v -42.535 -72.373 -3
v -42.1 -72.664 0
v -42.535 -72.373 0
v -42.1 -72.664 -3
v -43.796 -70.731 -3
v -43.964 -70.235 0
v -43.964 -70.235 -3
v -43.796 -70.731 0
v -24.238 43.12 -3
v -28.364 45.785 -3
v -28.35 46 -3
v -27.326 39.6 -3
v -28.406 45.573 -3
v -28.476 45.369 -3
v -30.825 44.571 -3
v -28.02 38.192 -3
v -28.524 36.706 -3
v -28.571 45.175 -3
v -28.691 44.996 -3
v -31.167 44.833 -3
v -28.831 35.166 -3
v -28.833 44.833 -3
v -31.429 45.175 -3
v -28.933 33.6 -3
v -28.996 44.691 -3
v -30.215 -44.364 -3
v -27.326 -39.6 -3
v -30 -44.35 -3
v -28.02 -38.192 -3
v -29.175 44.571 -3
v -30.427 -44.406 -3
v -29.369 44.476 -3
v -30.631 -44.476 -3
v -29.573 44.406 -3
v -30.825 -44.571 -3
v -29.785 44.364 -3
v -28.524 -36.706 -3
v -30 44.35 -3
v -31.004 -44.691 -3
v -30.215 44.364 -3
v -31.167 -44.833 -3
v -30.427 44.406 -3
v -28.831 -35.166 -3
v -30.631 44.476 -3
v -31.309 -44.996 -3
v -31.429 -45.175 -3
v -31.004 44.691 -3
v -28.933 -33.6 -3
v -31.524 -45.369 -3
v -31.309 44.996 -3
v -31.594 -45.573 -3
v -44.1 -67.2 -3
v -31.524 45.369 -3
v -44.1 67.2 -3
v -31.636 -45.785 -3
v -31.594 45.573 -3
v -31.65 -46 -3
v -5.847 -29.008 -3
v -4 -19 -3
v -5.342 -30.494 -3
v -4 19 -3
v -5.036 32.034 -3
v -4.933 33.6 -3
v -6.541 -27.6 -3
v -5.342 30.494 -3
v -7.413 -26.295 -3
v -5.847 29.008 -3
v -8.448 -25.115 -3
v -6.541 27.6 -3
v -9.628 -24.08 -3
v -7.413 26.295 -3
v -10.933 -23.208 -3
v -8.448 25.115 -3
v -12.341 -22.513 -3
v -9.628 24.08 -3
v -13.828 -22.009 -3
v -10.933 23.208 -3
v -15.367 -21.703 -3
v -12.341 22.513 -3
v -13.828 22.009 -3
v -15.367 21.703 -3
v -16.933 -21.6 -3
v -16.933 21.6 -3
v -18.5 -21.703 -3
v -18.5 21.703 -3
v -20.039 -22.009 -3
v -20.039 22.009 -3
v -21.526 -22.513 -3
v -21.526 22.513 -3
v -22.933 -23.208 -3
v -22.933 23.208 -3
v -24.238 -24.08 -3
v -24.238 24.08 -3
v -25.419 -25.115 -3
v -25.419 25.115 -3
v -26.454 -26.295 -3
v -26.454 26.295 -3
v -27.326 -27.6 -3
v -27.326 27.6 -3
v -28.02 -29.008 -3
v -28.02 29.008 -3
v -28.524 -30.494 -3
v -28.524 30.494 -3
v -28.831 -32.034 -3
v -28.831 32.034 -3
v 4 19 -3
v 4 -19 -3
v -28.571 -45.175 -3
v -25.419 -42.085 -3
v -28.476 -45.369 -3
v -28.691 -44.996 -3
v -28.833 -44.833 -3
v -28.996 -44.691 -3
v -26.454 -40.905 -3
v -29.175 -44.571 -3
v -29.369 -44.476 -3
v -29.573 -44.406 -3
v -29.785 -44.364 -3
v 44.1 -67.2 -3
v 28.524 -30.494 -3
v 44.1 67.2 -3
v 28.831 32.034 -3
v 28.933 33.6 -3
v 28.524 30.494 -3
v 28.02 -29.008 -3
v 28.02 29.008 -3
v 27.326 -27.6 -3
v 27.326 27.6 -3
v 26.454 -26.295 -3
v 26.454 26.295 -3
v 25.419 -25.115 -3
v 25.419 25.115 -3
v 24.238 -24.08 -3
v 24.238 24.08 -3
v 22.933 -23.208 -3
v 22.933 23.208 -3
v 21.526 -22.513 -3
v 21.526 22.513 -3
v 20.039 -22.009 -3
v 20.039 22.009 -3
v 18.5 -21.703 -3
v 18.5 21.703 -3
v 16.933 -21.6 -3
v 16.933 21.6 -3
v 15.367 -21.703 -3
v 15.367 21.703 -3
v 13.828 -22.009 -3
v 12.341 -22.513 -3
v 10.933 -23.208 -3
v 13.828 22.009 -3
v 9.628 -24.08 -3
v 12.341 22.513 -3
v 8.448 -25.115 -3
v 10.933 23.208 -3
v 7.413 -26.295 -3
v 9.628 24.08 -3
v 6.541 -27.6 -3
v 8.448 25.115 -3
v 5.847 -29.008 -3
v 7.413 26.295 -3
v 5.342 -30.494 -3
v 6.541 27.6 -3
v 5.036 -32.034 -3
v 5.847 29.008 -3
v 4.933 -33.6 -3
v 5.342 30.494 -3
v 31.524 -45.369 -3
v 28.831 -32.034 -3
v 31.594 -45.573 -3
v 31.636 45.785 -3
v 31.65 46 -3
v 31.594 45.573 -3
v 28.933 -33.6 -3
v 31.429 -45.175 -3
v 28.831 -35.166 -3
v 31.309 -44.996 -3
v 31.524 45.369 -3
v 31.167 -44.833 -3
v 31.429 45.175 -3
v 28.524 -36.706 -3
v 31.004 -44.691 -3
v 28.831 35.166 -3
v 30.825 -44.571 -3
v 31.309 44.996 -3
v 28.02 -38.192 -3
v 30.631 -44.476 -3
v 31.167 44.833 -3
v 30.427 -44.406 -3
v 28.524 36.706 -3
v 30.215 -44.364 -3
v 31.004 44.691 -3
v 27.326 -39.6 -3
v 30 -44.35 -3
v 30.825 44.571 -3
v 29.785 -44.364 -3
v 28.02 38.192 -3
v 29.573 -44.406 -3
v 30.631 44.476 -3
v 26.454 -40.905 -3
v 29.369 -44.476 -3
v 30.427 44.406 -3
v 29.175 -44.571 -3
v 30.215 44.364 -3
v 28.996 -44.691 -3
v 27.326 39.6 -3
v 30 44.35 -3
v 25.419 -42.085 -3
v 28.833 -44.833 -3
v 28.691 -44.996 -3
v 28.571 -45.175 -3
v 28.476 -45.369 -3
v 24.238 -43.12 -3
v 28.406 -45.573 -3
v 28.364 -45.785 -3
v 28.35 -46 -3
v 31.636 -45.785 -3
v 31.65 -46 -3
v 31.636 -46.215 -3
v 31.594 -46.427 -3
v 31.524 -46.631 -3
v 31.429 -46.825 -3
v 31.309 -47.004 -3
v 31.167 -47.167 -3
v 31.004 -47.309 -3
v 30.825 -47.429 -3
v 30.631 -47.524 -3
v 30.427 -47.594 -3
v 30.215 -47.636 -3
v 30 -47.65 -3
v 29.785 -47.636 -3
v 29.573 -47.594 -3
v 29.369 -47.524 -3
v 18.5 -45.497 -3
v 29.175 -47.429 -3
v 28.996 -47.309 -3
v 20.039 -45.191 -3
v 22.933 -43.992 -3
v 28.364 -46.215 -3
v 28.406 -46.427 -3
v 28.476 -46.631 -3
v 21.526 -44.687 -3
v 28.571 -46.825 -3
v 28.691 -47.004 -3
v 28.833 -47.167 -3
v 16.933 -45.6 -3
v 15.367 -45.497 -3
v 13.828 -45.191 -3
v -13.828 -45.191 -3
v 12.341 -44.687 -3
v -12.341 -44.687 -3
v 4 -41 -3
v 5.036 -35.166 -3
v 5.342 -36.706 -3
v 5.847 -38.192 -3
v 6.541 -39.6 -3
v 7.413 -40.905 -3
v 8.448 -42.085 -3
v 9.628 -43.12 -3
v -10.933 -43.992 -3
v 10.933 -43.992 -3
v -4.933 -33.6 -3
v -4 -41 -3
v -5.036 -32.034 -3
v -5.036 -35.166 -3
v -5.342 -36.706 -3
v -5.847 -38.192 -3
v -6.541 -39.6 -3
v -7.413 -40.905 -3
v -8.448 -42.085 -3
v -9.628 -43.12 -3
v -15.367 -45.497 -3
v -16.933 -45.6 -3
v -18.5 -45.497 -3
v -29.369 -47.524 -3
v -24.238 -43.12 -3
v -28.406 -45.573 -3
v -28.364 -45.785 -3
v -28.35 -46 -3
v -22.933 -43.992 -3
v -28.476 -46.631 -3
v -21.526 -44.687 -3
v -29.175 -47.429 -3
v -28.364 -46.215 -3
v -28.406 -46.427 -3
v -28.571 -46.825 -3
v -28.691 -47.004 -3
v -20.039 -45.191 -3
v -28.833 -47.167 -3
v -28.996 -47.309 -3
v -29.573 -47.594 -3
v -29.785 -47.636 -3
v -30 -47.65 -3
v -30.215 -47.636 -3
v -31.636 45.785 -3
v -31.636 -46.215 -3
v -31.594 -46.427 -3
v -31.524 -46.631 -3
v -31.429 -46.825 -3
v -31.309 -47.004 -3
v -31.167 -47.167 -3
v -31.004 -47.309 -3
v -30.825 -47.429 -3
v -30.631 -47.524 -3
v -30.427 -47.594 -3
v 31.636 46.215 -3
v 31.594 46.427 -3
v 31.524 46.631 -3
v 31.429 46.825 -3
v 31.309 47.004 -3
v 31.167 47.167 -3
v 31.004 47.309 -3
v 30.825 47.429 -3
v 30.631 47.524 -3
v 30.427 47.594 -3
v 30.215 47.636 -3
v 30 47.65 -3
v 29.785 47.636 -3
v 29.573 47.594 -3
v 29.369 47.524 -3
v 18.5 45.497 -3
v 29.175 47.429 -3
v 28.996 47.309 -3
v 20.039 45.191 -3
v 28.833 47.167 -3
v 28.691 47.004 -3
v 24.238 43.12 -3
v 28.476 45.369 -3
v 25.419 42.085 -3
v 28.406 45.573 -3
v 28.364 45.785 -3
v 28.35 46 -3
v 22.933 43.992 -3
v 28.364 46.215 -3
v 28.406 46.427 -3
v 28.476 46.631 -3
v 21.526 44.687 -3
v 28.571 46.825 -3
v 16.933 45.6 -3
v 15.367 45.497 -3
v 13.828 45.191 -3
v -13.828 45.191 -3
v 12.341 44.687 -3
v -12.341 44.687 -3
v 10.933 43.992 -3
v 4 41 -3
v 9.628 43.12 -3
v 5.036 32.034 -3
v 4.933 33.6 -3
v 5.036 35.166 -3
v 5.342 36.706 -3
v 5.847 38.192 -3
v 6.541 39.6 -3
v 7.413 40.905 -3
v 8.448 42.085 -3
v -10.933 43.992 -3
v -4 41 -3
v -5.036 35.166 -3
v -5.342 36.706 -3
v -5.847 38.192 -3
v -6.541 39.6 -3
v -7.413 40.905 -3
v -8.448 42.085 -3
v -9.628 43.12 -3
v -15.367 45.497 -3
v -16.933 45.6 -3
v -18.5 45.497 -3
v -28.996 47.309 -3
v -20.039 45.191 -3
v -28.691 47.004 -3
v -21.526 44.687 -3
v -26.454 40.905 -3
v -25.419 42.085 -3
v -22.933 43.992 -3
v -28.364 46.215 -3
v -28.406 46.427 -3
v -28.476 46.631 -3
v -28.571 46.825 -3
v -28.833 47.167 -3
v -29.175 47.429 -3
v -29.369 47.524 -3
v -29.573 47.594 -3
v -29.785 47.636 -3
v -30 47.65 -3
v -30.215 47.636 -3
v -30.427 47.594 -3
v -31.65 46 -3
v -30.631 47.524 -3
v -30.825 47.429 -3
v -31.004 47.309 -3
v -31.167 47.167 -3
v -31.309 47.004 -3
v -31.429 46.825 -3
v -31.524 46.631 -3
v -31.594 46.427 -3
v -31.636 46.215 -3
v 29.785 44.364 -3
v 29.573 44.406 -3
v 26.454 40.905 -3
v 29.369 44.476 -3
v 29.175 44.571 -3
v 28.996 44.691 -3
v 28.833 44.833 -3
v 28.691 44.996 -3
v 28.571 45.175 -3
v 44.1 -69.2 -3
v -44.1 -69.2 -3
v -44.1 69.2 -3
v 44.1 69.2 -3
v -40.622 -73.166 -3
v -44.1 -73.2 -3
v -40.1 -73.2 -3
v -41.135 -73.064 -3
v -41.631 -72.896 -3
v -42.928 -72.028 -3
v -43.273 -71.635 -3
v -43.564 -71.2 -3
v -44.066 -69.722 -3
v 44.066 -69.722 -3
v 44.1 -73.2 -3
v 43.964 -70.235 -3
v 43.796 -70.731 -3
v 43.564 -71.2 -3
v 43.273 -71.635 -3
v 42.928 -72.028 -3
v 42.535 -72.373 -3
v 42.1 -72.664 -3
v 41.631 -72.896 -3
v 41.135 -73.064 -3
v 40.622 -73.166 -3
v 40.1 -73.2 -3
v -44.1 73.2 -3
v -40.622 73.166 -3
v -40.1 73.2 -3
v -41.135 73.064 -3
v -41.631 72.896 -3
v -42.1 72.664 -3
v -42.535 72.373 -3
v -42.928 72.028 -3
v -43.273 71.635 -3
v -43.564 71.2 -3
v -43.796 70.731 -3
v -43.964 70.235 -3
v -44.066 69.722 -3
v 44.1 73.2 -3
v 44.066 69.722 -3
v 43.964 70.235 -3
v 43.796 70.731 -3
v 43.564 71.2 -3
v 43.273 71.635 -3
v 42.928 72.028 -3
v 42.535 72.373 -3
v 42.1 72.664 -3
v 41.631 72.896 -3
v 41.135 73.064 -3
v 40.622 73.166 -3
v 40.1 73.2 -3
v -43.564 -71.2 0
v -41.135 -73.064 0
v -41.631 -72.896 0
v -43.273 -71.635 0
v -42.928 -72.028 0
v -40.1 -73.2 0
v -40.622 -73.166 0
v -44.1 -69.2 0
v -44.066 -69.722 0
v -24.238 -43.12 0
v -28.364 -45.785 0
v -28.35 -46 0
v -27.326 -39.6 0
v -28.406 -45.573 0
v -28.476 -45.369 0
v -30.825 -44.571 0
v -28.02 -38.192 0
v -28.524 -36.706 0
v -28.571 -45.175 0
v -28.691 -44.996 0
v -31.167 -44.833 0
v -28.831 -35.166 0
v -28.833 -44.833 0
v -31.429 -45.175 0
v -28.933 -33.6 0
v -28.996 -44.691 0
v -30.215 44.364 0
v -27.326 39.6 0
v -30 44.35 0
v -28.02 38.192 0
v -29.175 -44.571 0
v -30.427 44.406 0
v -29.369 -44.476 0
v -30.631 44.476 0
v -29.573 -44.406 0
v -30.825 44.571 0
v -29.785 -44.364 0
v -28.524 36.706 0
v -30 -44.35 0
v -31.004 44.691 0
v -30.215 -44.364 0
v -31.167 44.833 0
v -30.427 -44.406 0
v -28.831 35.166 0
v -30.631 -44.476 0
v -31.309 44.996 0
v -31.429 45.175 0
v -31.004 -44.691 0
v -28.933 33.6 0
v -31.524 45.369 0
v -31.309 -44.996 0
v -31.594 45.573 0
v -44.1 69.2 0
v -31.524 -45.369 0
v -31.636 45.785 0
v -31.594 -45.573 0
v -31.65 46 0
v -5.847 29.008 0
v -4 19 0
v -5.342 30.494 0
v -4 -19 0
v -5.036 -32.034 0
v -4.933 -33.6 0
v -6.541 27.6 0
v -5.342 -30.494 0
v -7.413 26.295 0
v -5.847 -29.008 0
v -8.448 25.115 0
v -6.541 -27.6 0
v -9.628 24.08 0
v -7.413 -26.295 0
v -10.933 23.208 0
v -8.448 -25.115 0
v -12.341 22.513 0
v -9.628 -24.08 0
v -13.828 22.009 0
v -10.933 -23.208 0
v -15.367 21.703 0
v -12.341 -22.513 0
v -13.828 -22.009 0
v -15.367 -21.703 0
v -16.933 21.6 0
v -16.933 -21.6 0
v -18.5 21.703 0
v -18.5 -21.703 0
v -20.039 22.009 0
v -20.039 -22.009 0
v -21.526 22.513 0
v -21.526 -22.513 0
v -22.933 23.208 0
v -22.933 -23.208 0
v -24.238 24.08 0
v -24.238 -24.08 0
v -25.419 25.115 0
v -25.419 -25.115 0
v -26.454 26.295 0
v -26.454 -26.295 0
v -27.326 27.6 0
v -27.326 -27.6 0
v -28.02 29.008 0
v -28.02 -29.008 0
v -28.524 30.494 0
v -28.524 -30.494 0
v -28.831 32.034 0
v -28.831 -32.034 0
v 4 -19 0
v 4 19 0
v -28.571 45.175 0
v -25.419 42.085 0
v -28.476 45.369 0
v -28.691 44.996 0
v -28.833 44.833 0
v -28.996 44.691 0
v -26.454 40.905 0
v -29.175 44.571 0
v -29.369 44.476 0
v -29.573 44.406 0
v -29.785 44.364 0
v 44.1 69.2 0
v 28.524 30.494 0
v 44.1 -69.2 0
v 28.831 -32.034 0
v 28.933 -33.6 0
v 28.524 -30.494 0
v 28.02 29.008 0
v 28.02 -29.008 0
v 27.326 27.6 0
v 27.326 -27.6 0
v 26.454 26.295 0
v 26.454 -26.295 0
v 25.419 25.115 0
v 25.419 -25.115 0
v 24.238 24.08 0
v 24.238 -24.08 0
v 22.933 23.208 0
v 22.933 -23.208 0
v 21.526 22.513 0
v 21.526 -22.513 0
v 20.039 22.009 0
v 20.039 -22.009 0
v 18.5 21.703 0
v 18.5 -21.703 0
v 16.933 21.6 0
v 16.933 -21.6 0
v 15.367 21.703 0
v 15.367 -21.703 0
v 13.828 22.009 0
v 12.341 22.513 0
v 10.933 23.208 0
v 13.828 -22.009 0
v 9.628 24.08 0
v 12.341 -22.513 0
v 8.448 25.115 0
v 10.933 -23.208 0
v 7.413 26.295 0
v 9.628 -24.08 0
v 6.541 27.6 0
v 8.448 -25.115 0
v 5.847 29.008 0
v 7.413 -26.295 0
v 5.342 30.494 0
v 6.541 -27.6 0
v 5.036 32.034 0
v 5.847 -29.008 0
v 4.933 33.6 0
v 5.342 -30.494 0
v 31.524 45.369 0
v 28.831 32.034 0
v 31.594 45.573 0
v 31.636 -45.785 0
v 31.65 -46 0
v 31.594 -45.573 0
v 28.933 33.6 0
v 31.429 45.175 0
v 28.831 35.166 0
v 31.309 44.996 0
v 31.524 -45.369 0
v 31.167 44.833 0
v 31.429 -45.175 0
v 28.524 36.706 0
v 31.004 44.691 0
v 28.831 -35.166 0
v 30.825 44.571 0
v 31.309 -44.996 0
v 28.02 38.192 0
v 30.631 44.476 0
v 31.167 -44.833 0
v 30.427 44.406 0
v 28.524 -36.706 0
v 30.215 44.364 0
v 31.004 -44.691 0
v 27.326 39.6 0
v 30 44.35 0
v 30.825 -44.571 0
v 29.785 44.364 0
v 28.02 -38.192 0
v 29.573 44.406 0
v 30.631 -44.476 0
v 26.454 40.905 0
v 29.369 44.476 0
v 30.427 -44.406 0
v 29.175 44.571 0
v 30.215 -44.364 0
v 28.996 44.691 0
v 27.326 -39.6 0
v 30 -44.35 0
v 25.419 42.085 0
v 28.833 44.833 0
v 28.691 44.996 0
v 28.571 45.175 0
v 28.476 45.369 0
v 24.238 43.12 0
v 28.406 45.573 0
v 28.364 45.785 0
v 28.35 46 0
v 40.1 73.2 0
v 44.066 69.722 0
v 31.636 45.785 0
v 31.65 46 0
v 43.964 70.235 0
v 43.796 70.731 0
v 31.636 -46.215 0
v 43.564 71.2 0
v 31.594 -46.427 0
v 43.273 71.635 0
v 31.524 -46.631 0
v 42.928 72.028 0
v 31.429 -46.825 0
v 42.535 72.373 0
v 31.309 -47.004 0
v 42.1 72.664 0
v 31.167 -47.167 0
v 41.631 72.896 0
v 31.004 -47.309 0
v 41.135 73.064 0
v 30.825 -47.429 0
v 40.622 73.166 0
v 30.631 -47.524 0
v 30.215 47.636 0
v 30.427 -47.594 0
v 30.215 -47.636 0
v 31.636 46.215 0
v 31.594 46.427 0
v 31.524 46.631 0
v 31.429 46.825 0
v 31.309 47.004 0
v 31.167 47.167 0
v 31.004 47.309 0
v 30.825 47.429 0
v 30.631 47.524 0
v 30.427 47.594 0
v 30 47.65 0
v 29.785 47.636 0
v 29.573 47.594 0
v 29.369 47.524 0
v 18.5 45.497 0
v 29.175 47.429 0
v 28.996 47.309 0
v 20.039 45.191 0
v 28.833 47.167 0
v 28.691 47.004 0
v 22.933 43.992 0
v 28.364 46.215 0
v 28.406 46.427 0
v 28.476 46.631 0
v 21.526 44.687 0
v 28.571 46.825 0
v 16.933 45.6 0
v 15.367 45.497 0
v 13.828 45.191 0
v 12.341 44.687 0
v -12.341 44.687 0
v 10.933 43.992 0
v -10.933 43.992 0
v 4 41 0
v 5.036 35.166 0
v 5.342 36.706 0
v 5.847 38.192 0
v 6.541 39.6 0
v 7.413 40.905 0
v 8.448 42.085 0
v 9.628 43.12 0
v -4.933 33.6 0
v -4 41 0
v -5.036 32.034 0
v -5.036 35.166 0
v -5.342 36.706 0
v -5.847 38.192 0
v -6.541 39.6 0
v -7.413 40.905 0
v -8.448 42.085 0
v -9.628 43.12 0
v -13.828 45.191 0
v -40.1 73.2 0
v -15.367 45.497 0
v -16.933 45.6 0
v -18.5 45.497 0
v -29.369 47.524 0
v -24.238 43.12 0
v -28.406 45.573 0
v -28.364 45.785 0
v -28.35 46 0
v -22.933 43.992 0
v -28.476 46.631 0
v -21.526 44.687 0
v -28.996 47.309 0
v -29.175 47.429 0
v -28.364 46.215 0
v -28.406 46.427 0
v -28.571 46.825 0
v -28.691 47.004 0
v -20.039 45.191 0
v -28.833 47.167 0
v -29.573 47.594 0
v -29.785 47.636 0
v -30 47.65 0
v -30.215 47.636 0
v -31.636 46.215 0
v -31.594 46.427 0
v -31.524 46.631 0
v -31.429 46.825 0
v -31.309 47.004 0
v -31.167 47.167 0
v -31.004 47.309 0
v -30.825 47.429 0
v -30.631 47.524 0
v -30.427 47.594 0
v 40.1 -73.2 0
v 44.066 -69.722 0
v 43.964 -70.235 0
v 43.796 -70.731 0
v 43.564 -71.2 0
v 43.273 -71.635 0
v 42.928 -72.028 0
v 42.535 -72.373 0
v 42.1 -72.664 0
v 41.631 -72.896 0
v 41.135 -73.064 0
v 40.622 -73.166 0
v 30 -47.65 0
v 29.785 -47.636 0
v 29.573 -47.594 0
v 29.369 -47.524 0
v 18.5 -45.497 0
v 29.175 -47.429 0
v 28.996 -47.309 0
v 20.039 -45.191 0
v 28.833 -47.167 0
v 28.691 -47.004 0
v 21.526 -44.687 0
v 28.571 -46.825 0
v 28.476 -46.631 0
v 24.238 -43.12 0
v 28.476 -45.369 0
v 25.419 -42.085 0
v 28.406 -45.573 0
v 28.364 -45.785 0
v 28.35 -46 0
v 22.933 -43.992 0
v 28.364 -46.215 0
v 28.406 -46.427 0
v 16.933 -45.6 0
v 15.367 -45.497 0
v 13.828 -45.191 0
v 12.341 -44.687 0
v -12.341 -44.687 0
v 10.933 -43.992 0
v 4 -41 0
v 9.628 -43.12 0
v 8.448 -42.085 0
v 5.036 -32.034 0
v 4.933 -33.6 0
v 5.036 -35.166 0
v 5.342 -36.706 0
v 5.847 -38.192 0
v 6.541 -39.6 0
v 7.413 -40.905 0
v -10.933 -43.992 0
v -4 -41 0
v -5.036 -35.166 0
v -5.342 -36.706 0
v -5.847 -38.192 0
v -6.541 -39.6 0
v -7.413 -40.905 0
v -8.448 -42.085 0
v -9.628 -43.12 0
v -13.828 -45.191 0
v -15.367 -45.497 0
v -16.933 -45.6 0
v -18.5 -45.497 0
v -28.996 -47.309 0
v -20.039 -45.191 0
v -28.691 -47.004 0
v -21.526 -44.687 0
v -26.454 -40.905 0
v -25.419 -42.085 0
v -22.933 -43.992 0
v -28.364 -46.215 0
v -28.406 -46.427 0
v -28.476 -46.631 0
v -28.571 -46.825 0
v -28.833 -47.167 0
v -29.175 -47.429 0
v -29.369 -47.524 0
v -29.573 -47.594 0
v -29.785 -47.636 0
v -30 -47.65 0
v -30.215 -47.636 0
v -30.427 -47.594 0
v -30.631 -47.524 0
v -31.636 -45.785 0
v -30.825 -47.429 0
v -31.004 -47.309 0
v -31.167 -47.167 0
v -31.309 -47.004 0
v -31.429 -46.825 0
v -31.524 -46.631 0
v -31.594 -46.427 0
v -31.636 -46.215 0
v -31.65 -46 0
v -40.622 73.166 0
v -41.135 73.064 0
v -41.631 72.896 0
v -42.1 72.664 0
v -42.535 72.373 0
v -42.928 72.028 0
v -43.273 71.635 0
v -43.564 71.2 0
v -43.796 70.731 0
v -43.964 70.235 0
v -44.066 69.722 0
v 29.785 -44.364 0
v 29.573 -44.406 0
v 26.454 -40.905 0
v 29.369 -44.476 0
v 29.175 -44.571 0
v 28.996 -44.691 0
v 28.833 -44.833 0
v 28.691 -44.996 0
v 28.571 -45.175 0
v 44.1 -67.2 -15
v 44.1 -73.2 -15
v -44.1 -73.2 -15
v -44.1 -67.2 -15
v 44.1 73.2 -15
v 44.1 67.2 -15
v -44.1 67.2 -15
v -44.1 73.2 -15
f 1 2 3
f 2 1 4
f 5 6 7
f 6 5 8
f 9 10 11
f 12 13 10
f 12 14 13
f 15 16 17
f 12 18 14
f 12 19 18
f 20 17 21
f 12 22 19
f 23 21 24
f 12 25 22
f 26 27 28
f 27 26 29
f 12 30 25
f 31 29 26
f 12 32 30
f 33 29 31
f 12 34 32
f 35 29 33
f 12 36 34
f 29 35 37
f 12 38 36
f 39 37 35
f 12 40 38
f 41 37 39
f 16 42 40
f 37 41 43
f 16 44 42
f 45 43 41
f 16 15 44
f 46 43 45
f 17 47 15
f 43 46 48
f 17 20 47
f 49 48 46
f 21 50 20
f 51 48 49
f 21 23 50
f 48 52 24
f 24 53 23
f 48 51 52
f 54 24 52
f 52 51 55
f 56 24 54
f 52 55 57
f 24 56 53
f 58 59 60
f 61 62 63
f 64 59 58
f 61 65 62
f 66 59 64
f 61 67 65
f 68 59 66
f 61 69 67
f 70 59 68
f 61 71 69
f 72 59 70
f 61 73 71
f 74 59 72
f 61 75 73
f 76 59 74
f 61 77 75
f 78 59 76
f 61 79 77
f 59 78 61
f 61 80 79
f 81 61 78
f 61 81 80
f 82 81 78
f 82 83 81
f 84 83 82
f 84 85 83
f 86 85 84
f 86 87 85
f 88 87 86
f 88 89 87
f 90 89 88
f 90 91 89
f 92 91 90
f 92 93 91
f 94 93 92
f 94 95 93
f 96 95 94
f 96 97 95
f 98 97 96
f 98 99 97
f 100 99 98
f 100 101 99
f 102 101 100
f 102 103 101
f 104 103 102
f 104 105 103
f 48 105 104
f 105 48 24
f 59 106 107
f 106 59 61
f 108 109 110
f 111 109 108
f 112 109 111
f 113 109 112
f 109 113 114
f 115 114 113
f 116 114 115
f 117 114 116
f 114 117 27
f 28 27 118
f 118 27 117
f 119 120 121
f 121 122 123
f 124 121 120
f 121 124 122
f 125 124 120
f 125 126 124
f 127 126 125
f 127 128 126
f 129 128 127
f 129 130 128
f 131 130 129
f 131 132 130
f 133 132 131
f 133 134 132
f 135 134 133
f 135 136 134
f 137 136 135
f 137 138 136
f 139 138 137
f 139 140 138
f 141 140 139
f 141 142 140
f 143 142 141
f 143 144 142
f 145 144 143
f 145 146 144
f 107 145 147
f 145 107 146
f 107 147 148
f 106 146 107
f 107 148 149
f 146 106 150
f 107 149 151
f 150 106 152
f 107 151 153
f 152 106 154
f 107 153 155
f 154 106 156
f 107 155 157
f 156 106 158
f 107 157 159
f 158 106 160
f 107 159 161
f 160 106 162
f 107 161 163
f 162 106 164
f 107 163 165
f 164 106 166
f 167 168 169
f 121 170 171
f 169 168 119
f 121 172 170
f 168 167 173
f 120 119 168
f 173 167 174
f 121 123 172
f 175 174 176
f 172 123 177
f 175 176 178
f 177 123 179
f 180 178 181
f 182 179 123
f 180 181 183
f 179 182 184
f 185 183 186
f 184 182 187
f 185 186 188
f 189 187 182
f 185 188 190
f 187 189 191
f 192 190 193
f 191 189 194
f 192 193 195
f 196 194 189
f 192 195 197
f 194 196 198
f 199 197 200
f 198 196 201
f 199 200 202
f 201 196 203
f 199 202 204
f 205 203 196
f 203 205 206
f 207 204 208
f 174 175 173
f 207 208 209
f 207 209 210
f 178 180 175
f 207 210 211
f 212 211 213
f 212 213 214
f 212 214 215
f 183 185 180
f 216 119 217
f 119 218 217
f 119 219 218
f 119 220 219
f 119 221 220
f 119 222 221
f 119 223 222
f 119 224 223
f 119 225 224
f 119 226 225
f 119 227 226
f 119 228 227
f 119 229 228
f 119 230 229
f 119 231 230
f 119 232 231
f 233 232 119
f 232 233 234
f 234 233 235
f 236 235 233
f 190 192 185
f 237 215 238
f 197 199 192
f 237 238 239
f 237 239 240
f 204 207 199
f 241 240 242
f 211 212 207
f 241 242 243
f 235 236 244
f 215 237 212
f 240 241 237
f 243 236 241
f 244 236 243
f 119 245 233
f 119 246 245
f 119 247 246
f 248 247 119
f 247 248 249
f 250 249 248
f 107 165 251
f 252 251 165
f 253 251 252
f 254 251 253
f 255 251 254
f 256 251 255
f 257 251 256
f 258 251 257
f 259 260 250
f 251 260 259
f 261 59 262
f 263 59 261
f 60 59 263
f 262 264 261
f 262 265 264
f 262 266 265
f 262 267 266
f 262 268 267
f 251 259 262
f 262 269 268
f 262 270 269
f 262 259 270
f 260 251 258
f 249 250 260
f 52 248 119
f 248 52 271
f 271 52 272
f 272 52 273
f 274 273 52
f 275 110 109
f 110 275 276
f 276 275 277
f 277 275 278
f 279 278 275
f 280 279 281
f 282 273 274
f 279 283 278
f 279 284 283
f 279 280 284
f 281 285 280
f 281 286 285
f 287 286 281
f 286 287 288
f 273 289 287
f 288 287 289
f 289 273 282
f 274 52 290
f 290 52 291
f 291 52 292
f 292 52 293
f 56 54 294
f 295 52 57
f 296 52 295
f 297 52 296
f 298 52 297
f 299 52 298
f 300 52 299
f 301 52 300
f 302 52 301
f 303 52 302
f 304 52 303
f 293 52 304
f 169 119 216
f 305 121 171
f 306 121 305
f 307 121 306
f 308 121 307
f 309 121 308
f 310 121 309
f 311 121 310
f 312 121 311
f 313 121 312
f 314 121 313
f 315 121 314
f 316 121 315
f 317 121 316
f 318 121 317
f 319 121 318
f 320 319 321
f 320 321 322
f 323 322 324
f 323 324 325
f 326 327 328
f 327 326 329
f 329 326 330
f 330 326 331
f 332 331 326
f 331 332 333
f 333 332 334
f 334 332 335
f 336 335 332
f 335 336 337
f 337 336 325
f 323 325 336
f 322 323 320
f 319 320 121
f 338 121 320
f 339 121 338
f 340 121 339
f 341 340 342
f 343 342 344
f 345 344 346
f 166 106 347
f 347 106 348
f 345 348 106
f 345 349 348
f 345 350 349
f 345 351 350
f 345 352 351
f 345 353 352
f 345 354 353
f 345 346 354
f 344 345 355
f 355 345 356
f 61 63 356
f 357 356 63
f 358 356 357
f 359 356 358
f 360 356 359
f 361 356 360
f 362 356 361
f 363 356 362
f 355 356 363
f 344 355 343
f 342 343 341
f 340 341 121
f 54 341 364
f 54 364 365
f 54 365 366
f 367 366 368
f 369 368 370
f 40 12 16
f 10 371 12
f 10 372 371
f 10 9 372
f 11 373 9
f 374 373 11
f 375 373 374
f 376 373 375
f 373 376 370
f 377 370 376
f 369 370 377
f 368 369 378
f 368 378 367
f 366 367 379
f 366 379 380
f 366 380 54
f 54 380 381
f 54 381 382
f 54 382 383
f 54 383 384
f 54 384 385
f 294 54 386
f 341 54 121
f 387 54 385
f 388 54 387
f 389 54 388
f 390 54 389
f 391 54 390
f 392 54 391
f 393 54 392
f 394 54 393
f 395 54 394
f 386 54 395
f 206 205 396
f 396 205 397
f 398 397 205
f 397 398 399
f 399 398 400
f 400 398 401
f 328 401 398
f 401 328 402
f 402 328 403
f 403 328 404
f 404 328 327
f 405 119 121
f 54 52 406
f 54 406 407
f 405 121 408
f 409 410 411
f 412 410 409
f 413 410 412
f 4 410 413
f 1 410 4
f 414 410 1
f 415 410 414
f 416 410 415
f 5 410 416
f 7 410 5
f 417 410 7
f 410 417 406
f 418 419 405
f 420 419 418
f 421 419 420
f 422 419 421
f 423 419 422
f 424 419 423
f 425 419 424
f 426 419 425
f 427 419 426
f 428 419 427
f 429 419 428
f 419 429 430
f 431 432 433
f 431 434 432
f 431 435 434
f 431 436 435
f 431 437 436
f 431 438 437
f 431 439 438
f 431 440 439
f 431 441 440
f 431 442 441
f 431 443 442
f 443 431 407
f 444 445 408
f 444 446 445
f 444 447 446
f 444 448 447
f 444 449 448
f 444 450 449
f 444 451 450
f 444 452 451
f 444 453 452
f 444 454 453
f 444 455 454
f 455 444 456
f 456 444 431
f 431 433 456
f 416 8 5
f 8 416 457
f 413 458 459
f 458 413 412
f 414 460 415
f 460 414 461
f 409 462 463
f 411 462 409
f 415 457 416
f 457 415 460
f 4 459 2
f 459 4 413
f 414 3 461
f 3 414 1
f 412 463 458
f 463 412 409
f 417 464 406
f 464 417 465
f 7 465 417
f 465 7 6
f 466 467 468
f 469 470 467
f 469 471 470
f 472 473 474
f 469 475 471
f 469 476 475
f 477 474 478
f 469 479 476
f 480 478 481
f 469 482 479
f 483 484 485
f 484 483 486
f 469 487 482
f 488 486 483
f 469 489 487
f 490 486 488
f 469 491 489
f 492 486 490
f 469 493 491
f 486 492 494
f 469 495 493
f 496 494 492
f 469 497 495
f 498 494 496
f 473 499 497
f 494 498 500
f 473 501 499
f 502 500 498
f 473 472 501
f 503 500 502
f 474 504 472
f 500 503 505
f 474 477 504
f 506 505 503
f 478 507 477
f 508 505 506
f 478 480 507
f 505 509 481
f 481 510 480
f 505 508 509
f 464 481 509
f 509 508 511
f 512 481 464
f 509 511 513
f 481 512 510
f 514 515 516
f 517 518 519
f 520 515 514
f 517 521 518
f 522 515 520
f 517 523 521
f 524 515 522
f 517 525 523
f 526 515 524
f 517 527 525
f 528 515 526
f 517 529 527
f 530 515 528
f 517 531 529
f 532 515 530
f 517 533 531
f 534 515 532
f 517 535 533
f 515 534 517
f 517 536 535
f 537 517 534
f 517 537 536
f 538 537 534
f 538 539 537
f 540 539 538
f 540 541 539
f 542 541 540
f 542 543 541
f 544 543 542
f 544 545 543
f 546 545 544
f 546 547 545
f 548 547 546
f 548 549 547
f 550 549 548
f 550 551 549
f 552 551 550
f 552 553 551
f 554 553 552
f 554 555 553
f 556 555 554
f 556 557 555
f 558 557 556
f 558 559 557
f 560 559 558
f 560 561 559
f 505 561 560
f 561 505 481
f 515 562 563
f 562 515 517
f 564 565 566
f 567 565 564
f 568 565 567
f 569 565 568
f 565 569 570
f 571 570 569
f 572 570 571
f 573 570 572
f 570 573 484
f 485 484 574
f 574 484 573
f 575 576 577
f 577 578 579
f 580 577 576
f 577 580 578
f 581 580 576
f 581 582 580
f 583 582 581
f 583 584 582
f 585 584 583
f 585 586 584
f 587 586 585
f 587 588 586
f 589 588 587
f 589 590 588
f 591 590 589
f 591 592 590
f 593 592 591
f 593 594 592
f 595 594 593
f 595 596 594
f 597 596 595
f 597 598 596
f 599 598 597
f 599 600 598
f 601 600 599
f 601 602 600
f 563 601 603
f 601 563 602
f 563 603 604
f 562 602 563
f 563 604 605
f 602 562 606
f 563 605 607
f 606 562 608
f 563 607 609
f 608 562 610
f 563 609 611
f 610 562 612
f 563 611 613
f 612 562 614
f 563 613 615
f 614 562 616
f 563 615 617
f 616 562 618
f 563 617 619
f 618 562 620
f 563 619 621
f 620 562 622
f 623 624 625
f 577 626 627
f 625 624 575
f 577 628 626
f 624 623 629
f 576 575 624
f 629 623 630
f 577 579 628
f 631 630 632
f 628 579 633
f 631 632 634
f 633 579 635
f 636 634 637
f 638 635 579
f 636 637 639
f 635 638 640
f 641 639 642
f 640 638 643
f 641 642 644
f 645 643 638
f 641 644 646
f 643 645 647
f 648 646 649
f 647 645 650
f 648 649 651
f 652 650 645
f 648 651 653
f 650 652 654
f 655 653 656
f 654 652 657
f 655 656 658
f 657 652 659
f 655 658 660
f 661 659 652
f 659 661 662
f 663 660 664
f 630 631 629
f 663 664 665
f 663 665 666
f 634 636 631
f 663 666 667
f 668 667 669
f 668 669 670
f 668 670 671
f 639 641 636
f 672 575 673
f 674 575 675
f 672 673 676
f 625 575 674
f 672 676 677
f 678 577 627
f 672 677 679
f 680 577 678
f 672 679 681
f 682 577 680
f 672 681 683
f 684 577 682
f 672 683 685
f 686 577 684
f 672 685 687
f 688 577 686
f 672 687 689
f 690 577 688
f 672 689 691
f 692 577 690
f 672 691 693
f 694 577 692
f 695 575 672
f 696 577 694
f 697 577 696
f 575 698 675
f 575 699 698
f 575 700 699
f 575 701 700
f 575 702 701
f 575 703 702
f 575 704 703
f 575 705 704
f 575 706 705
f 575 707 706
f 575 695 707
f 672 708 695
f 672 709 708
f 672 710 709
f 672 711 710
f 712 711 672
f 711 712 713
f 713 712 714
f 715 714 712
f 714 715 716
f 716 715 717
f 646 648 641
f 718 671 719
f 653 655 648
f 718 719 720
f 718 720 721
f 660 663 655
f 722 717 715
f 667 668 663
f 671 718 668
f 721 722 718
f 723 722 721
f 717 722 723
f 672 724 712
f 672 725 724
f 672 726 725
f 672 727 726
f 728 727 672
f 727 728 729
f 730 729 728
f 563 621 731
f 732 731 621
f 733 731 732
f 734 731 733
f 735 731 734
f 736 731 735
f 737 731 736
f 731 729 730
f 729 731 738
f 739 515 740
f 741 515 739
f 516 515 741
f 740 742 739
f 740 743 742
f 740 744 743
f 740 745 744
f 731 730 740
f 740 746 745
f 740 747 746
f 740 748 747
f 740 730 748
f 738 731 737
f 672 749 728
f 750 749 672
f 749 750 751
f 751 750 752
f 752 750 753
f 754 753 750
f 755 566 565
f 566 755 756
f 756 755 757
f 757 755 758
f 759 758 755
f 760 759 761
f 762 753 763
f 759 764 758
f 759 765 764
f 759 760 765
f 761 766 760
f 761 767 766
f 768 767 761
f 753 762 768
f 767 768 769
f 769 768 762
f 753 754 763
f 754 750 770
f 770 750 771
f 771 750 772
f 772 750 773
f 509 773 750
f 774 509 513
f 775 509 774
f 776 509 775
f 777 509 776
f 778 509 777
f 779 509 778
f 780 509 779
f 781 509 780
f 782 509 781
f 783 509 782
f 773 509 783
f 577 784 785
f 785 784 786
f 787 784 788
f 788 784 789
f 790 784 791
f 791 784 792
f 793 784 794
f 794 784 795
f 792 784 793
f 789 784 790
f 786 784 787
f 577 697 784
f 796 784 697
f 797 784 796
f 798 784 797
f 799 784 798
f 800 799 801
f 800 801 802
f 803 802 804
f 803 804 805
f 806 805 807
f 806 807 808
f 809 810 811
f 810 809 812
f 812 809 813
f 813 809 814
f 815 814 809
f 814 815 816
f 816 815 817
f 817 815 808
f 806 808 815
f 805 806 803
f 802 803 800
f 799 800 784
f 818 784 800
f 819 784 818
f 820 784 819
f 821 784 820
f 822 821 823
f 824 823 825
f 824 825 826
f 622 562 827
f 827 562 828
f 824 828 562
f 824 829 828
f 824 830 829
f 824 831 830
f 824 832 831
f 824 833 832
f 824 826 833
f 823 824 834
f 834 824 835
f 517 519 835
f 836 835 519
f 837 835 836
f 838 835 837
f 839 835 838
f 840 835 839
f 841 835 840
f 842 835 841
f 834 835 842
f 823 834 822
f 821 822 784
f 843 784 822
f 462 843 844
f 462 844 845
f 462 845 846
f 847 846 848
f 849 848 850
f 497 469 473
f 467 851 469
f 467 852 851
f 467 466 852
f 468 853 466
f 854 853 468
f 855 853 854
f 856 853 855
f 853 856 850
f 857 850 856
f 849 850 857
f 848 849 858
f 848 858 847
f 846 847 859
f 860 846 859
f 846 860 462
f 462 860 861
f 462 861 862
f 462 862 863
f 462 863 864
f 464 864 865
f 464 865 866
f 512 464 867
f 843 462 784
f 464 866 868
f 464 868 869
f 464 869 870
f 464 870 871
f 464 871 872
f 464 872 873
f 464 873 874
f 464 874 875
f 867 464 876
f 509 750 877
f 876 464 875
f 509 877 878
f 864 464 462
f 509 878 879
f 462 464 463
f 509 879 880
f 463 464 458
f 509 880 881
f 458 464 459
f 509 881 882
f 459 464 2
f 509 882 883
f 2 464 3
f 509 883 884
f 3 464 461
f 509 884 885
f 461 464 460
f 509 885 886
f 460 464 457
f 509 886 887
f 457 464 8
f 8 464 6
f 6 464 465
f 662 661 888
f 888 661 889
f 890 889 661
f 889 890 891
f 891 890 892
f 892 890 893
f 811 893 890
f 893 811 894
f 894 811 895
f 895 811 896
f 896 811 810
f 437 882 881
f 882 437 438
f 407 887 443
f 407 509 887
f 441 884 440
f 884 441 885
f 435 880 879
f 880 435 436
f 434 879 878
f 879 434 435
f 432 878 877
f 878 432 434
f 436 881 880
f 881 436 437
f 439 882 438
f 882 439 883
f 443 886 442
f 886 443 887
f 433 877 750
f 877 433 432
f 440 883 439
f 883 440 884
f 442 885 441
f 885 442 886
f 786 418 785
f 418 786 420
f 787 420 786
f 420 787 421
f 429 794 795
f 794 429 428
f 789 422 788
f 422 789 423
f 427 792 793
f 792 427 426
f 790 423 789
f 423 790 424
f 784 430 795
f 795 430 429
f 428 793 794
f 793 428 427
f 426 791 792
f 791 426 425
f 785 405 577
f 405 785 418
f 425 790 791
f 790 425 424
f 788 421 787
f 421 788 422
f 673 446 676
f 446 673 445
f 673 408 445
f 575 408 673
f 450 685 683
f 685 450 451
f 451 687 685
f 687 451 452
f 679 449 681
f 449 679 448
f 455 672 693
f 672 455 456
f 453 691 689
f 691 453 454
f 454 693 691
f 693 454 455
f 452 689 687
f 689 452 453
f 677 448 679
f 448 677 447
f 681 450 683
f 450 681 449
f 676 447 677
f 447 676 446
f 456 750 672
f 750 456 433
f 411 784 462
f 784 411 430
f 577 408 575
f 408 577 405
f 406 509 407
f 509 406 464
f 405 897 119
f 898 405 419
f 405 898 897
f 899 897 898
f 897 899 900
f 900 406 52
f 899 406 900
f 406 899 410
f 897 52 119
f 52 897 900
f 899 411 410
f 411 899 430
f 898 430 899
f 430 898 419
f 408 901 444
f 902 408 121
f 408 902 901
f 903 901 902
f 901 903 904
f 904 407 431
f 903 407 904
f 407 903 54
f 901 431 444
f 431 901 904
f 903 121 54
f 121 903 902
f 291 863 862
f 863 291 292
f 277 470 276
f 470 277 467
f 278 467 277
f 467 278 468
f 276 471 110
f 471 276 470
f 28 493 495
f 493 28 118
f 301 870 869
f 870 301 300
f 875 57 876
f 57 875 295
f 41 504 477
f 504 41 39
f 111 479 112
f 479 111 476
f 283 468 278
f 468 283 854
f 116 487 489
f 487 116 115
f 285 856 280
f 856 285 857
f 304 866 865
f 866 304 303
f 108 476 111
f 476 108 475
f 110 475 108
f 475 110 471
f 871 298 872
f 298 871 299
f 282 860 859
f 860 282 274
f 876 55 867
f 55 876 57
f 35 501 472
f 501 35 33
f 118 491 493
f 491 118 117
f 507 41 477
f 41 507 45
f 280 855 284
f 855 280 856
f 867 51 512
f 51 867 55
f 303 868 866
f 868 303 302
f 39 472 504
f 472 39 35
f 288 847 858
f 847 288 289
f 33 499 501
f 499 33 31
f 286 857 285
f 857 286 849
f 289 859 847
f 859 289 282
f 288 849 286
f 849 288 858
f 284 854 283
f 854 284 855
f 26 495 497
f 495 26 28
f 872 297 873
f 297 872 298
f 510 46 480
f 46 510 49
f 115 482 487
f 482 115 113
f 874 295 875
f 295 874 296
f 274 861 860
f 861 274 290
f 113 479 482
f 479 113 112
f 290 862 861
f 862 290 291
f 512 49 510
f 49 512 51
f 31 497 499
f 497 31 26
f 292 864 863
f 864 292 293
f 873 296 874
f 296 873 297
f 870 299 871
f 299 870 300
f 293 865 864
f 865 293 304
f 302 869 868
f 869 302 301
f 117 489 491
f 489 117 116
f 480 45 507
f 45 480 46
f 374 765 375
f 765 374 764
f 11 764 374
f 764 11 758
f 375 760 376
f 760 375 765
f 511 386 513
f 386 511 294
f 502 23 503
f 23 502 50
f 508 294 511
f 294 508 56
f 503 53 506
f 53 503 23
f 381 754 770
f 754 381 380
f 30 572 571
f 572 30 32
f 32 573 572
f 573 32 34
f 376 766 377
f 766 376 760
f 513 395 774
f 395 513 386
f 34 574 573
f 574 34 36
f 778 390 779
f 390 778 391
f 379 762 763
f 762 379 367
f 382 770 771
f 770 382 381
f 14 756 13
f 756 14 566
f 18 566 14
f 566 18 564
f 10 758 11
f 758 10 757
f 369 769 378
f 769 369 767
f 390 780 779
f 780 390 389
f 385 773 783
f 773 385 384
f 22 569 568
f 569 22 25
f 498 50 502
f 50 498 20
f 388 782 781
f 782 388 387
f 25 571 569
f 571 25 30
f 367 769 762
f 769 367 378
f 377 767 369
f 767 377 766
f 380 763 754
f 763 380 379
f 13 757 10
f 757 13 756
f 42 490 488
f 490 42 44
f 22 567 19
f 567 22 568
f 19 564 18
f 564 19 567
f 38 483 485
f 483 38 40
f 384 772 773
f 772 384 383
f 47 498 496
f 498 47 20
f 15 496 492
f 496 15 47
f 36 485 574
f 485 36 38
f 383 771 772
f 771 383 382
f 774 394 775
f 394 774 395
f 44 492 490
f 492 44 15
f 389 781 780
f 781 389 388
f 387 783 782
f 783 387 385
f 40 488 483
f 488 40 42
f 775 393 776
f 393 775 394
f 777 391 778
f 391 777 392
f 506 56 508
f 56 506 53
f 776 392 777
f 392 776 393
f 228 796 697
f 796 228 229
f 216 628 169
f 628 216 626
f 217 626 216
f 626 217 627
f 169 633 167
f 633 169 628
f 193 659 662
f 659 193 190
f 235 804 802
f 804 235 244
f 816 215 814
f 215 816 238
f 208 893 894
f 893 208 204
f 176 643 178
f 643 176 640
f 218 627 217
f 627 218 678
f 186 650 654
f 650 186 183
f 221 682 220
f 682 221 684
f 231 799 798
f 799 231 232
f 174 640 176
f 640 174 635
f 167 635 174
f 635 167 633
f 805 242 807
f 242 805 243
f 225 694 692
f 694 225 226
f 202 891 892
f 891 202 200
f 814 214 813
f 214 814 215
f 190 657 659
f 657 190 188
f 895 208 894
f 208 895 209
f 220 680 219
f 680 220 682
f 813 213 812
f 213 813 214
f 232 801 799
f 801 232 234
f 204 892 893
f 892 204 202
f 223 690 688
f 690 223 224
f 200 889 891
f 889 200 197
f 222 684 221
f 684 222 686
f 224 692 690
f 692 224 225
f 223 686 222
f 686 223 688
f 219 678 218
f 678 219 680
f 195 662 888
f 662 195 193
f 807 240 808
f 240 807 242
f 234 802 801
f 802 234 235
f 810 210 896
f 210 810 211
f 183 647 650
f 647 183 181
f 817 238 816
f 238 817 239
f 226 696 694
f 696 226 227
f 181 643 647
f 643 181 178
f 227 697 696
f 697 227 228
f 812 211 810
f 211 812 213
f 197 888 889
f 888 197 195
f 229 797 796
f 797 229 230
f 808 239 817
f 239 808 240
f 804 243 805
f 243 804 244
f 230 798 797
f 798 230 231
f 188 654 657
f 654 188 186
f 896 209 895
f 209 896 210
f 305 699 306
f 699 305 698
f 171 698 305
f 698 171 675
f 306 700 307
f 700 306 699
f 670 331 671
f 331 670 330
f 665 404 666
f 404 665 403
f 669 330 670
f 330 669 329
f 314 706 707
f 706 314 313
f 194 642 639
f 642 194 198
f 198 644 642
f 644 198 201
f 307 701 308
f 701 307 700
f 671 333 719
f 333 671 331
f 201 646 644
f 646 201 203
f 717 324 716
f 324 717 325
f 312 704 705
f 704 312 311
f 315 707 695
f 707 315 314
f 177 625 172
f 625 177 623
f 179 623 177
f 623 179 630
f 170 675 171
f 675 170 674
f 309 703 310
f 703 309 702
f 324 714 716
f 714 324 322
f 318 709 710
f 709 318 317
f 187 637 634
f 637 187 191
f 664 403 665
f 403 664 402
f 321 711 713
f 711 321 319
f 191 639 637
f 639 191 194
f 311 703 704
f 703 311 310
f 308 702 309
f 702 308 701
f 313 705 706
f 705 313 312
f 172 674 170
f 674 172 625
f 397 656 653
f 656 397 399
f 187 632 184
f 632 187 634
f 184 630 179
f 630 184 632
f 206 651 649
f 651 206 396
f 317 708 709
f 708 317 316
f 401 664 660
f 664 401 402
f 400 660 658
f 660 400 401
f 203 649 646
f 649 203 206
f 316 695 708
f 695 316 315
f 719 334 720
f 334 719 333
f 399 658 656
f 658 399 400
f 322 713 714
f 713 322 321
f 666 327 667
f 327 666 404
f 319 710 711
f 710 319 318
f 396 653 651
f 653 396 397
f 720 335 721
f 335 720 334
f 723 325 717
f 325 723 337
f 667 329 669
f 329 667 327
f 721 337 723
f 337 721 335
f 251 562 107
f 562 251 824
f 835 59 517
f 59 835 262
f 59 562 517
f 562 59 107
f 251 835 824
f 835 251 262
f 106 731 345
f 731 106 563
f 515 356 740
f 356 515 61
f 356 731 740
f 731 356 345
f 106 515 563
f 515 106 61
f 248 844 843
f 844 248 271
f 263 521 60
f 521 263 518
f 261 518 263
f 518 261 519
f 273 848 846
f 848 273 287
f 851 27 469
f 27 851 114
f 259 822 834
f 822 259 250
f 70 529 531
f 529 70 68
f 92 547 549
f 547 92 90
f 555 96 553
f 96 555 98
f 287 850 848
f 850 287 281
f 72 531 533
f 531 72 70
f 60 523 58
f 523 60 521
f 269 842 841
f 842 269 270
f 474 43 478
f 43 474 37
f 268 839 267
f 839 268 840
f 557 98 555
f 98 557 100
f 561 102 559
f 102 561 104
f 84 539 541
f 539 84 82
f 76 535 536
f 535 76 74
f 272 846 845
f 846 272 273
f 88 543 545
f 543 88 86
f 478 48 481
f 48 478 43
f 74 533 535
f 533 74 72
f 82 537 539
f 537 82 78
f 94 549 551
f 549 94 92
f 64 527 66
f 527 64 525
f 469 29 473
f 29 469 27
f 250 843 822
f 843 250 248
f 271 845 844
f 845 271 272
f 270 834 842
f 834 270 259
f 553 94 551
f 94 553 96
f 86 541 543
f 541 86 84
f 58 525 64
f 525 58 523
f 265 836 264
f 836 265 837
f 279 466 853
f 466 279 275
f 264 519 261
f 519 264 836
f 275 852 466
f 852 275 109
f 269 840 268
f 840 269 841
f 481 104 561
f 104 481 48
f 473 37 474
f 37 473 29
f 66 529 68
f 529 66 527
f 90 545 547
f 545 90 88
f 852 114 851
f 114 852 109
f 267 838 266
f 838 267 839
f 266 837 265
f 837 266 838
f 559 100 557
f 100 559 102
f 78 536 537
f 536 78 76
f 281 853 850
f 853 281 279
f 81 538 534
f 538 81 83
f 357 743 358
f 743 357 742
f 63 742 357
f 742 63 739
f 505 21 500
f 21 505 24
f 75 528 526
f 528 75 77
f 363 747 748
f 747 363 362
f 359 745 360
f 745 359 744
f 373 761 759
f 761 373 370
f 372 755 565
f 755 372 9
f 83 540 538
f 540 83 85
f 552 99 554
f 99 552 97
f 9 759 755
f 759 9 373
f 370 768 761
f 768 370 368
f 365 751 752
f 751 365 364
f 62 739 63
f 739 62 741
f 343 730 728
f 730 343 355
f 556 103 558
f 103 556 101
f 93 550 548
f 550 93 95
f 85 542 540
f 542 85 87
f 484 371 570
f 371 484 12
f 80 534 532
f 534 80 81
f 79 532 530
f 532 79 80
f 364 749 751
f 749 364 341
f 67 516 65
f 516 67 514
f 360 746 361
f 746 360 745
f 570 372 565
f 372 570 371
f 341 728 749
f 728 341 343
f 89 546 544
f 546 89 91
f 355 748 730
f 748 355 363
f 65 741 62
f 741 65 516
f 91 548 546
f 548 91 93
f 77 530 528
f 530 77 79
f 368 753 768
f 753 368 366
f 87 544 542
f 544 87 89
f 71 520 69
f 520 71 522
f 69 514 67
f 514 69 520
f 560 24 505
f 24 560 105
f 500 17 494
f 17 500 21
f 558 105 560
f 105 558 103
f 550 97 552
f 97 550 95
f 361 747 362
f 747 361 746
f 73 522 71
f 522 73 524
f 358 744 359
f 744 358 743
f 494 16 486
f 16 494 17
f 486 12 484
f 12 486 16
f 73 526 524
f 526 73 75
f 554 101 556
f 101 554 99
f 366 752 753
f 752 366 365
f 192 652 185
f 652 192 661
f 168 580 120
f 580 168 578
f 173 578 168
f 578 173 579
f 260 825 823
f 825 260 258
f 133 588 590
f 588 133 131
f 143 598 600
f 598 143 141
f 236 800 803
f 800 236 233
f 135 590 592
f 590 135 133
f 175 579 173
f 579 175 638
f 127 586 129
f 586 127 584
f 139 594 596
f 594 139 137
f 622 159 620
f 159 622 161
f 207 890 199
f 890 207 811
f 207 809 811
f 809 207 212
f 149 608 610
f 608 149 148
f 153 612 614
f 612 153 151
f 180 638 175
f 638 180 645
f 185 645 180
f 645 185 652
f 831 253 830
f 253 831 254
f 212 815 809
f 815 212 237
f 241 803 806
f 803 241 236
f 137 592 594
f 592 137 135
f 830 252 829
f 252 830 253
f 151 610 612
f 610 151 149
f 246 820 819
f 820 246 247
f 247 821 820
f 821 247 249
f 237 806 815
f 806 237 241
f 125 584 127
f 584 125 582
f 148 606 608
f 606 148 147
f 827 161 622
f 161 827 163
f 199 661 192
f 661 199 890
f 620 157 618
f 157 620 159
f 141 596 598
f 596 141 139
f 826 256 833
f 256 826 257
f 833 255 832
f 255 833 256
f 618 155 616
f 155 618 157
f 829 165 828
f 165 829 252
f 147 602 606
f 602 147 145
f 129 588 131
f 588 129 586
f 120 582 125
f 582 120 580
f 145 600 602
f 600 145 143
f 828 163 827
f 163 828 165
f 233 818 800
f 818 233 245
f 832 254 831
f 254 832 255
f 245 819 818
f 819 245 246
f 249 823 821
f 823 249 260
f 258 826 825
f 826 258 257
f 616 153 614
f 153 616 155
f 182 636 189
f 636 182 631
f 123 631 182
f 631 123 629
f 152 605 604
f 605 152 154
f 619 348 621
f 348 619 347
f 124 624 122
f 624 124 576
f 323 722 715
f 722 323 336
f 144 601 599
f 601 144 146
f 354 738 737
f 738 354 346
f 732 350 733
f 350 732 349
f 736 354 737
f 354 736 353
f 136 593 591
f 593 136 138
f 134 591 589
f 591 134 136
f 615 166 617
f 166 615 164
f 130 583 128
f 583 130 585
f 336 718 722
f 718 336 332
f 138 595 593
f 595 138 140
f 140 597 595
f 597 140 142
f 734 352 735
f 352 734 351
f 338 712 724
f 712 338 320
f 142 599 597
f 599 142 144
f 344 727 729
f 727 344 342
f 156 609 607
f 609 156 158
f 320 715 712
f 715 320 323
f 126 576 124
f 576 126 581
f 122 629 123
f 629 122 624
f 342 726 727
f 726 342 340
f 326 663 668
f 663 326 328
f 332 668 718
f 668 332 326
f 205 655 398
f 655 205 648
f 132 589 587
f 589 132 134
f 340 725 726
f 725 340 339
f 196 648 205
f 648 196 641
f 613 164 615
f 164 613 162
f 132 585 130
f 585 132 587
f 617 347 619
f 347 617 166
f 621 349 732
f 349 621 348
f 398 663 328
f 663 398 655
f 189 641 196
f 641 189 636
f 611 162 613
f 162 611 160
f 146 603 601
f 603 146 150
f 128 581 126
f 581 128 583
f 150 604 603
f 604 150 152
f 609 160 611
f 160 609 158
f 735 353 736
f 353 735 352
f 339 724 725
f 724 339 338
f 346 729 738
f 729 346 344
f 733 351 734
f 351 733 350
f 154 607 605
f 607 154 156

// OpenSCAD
// file: ../common/ds_lib.scad
// DronSwarm · librería común de piezas del frame (S07-S08). Unidades: mm.
//
// Reglas (ADR-003): sin hull()/minkowski()/offset() — FreeCAD los convierte en malla y el STEP deja de ser un
// sólido válido. Las formas redondeadas se arman con uniones de cubos y cilindros. El importador CSG de FreeCAD
// también falla con booleanas 2D y con varios operandos agrupados bajo una sola transformación: cada grupo de
// agujeros debe ser hijo directo del difference(), con su propio translate.
//
// Interfaz de motor DronSwarm (DMI, ADR-011): placa con 4 ranuras radiales a 90°, de modo que el mismo soporte
// acepta varios patrones comerciales y, más adelante, el motor propio (S17+) se diseña para caer en el mismo rango.
//   DMI-S: 4×M3, círculo de tornillos Ø16-Ø25 (motores 28xx-41xx, ≤ 600 W)
//   DMI-L: 4×M4, círculo de tornillos Ø30-Ø42 (motores 50xx-70xx, ≤ 2 kW)

$fn = 48;

M3 = 3.3; M3_HEAD = 6.0; M3_NUT = 6.4;     // pasante, cabeza, tuerca (entre caras + juego)
M4 = 4.4; M4_HEAD = 7.5;
M5 = 5.4;

function dmi_bolt(iface) = iface == "L" ? M4 : M3;
function dmi_r(iface) = iface == "L" ? [15, 21] : [8, 12.5];   // radio mínimo y máximo de las ranuras
function dmi_plate_d(iface) = iface == "L" ? 56 : 36;
function dmi_center(iface) = iface == "L" ? 16 : 10;            // eje, seguro y paso de cables

// Rectángulo con esquinas redondeadas (2D) y su extrusión
module rrect2d(size, r) {
    r2 = min(r, size[0] / 2 - 0.01, size[1] / 2 - 0.01);
    union() {
        translate([r2, 0]) square([size[0] - 2 * r2, size[1]]);
        translate([0, r2]) square([size[0], size[1] - 2 * r2]);
        for (x = [r2, size[0] - r2], y = [r2, size[1] - r2]) translate([x, y]) circle(r = r2);
    }
}
// Caja redondeada con primitivas 3D (sin booleanas 2D: el importador CSG de FreeCAD falla con ellas)
module rbox(size, r) {
    r2 = min(r, size[0] / 2 - 0.01, size[1] / 2 - 0.01);
    union() {
        translate([r2, 0, 0]) cube([size[0] - 2 * r2, size[1], size[2]]);
        translate([0, r2, 0]) cube([size[0], size[1] - 2 * r2, size[2]]);
        for (x = [r2, size[0] - r2], y = [r2, size[1] - r2]) translate([x, y, 0]) cylinder(r = r2, h = size[2]);
    }
}
module crbox(size, r) { translate([-size[0] / 2, -size[1] / 2, 0]) rbox(size, r); }   // centrado en x/y

// Ranura (2D) entre dos puntos sobre el eje x
module slot2d(r0, r1, w) {
    union() {
        translate([r0, -w / 2]) square([r1 - r0, w]);
        translate([r0, 0]) circle(d = w);
        translate([r1, 0]) circle(d = w);
    }
}

// Agujeros de la interfaz de motor (para restar de una placa de espesor t)
module slot3d(r0, r1, w, h) {
    union() {
        translate([r0, -w / 2, 0]) cube([r1 - r0, w, h]);
        translate([r0, 0, 0]) cylinder(d = w, h = h);
        translate([r1, 0, 0]) cylinder(d = w, h = h);
    }
}
module dmi_holes(iface, t) {
    r = dmi_r(iface);
    translate([0, 0, -1]) union() {
        cylinder(d = dmi_center(iface), h = t + 2);
        for (a = [45, 135, 225, 315]) rotate(a) slot3d(r[0], r[1], dmi_bolt(iface), t + 2);
    }
}

// Soporte de motor en la punta del brazo: manguito sobre el tubo + placa DMI arriba
//   el tubo entra por -x; la placa queda centrada en el eje del motor (origen), cara superior en z = 0
module motor_mount(tube_d, iface = "S", sleeve = 34, wall = 3.5) {
    od = tube_d + 2 * wall;
    pd = dmi_plate_d(iface);
    pt = iface == "L" ? 6 : 4;
    zc = -pt - tube_d / 2 - 1;                 // eje del tubo bajo la placa
    difference() {
        union() {
            translate([0, 0, -pt]) cylinder(d = pd, h = pt);                         // placa DMI
            translate([-sleeve - pd / 2 + 6, 0, zc]) rotate([0, 90, 0])
                cylinder(d = od, h = sleeve + pd / 2 - 6 + 4);                       // manguito
            translate([-sleeve - pd / 2 + 6, -od / 2, zc]) cube([sleeve + pd / 2 - 2, od, -zc - pt + 0.01]);  // alma
            translate([-sleeve - pd / 2 + 6, -5, zc - od / 2 - 7]) cube([sleeve, 10, 8]);   // oreja de apriete
        }
        dmi_holes(iface, pt + 0.02, $fn = 32);
        translate([-sleeve - pd / 2 + 5, 0, zc]) rotate([0, 90, 0]) cylinder(d = tube_d + 0.3, h = sleeve + pd / 2 - 3); // tubo
        translate([-sleeve - pd / 2 + 4, -1, zc - od / 2 - 8]) cube([sleeve + 1, 2, od / 2 + 6]);   // ranura de apriete
        for (x = [0.3, 0.75]) translate([-sleeve - pd / 2 + 6 + x * sleeve, 0, zc - od / 2 - 3])
            rotate([90, 0, 0]) cylinder(d = M3, h = 30, center = true);                // tornillos de apriete
        translate([-pd / 2 - 2, 0, zc]) rotate([0, 90, 0]) cylinder(d = 7, h = pd);   // salida de cables del tubo
    }
}

// Bloque de brazo entre las dos placas centrales (impreso PA12-CF): sujeta el tubo y separa las placas.
//   el tubo sale por +x desde el origen; el bloque ocupa x ∈ [-len, 0], altura = gap
module arm_block(tube_d, gap, len = 40, width = 0, bolt = M3) {
    w = width > 0 ? width : tube_d + 14;
    difference() {
        translate([-len, -w / 2, 0]) rbox([len, w, gap], 2);
        translate([-len - 1, 0, gap / 2]) rotate([0, 90, 0]) cylinder(d = tube_d + 0.2, h = len + 2);   // tubo
        translate([-len - 1, -0.75, gap / 2]) cube([len + 2, 1.5, gap / 2 + 1]);                        // ranura de apriete
        for (p = arm_block_bolts(tube_d, len, w)) translate([p[0], p[1], -1]) cylinder(d = bolt, h = gap + 2);
        translate([-len * 0.5, 0, gap * 0.78]) rotate([90, 0, 0]) cylinder(d = M3, h = w + 2, center = true);  // apriete
    }
}
function arm_block_bolts(tube_d, len, w) =
    [for (x = [-len + 6, -6], y = [-(w / 2 - 3.6), w / 2 - 3.6]) [x, y]];

// Patrón de controladora de vuelo (agujeros M3 en cuadrado)
module fc_holes(pattern, t) {
    for (x = [-1, 1], y = [-1, 1]) translate([x * pattern / 2, y * pattern / 2, -1]) cylinder(d = M3, h = t + 2);
}
// file: ds_i_params.scad
// DS-I · parámetros generados por tools/cad/gen_cad_params.py el 2026-10-19
// desde engineering/data/results (spec v1). No editar a mano: regenerar. Unidades: mm, kg.

vehicle = "DS-I";
rotors = 4;
wheelbase = 672;
arm_radius = 336;
prop_d = 431.8;
tube_od = 20;
tube_wall = 1;
arm_len = 252;
plate_d = 168;
plate_t = 3;
plate_gap = 26;
motor_iface = "S";
battery_dims = [134.4, 76.2, 48.8];
battery = "6S2P 50S";
leg_h = 160;
fold_arms = false;
mtow_kg = 2.695;
motor_mass_kg = 0.074;
fc_pattern = 30.5;
gimbal_box = [90, 70, 105];
gimbal_damper_pitch = [60, 50];
// file: ds_i_frame.scad
// DS-I · geometría compartida del frame: posiciones derivadas de los parámetros (spec v1). Unidades: mm.
// Ejes: x adelante, y izquierda, z arriba. z = 0 es la cara superior de la placa inferior.
// Cada pieza vive en su propio archivo (center_plate.scad, arm_block.scad, …) e incluye este.

include <ds_i_params.scad>
use <../common/ds_lib.scad>
include <../common/ds_lib.scad>

arm_angles = [45, 135, 225, 315];         // quad X
block_len = 40;
block_w = tube_od + 14;
r_block_out = plate_d / 2 - 3;            // extremo exterior del bloque de brazo
tube_z = plate_gap / 2;                   // eje de los tubos
tube_len = arm_radius - r_block_out + block_len - 8;   // dentro del bloque hasta el soporte de motor
leg_offset = 70;                          // patas abrazadas al brazo, a esta distancia del bloque
leg_r = r_block_out + leg_offset;
leg_tube = 12;                            // tubo de las patas Ø12×1
battery_pos = [-28, 0];                   // batería transversal, atrás, bajo la placa
gimbal_pos = [62, 0];                     // cámara adelante, colgada con amortiguadores
housing_size = [120, 90, 58];             // carcasa IP54 sobre la placa superior
housing_pos = [0, 0];

// Contorno de las placas centrales (2D): círculo con lóbulos bajo cada bloque de brazo
module plate_outline() {
    union() {
        circle(d = plate_d, $fn = 96);
        for (a = arm_angles) rotate(a) translate([r_block_out - block_len - 4, -block_w / 2 - 4]) square([block_len + 7, block_w + 8]);
    }
}

// Agujeros comunes a ambas placas: tornillos de los bloques
module plate_common_holes() {
    for (a = arm_angles) rotate(a) translate([r_block_out, 0])
        for (p = arm_block_bolts(tube_od, block_len, block_w)) translate(p) circle(d = M3);
}

// Posiciones de piezas montadas en las placas
gimbal_mount_bolts = [for (x = [-25, 25], y = [-32, 32]) [gimbal_pos[0] - 15 + x, y]];   // adaptador bajo la placa
battery_tray_bolts = [for (x = [-30, 30], y = [-46, 46]) [battery_pos[0] + x, y]];
housing_flange = 10;
// tornillos de la brida a 6 mm de la pared (afuera del canal de la junta, que va de 0.6 a 2.6 mm)
housing_bolts = [[66, 0], [-66, 0], [0, 51], [0, -51], [40, 51], [40, -51], [-40, 51], [-40, -51]];
cable_gland_pos = [-housing_size[0] / 2 + 18, 0];      // paso de cables al interior de la carcasa (prensaestopa M12)
motor_d = motor_iface == "L" ? 62 : 38;   // motor de referencia (COTS, se confirma en S09)
motor_h = motor_iface == "L" ? 36 : 26;
tray_t = 3;                               // bandeja de batería
gm_t = 4;                                 // placas del adaptador de cámara
damper_h = 10;                            // amortiguadores de silicona
foot_h = 45;                              // pie amortiguador de TPU (≈ 30 mm de carrera)
foot_stroke = 30;
// Altura de las patas por condición de diseño: con el pie comprimido, la cámara no toca el suelo (10 mm de margen)
gimbal_bottom_z = -plate_t - 2 * gm_t - damper_h - gimbal_box[2];
ground_z = gimbal_bottom_z - foot_stroke - 10;
leg_top_z = tube_z - (tube_od + 8) / 2 - 2;     // tope del tubo de la pata dentro de la abrazadera
leg_len = (leg_top_z - ground_z) - (foot_h - 12);
mm_sleeve = 26;                           // manguito del soporte de motor (FEA: FS 37 con 34 mm, se acorta)
// main file
// DS-I · bandeja de batería bajo la placa inferior (impresa PA12-CF). La batería (6S2P, transversal) se sujeta con
// dos correas con hebilla que pasan por las ranuras de la placa; topes laterales para cambio rápido.
// Local: cara de apoyo contra la placa en z = 0, la batería cuelga hacia −z; centrada en battery_pos.
include <ds_i_frame.scad>
module battery_tray(t = tray_t) {
    bw = battery_dims[1];     // a lo largo de x (la batería va transversal: su largo en y)
    bl = battery_dims[0];
    difference() {
        union() {
            translate([0, 0, -t]) crbox([bw + 12, bl + 12, t], 4);
            for (y = [-1, 1]) translate([-(bw + 12) / 2, y * (bl / 2 + 3) - 3, -t - 12]) cube([bw + 12, 6, 12]);   // topes
        }
        for (p = battery_tray_bolts) translate([p[0] - battery_pos[0], p[1], -t - 1]) cylinder(d = M3, h = t + 2);
        for (y = [-1, 1]) translate([-4, y * 30 - 11, -t - 1]) cube([8, 22, t + 2]);                 // correas
        for (x = [-1, 1], y = [-1, 1]) translate([x * bw / 4.5, y * bl / 4, -t - 1]) cylinder(d = 24, h = t + 2);  // aligeramiento
    }
}
battery_tray();
